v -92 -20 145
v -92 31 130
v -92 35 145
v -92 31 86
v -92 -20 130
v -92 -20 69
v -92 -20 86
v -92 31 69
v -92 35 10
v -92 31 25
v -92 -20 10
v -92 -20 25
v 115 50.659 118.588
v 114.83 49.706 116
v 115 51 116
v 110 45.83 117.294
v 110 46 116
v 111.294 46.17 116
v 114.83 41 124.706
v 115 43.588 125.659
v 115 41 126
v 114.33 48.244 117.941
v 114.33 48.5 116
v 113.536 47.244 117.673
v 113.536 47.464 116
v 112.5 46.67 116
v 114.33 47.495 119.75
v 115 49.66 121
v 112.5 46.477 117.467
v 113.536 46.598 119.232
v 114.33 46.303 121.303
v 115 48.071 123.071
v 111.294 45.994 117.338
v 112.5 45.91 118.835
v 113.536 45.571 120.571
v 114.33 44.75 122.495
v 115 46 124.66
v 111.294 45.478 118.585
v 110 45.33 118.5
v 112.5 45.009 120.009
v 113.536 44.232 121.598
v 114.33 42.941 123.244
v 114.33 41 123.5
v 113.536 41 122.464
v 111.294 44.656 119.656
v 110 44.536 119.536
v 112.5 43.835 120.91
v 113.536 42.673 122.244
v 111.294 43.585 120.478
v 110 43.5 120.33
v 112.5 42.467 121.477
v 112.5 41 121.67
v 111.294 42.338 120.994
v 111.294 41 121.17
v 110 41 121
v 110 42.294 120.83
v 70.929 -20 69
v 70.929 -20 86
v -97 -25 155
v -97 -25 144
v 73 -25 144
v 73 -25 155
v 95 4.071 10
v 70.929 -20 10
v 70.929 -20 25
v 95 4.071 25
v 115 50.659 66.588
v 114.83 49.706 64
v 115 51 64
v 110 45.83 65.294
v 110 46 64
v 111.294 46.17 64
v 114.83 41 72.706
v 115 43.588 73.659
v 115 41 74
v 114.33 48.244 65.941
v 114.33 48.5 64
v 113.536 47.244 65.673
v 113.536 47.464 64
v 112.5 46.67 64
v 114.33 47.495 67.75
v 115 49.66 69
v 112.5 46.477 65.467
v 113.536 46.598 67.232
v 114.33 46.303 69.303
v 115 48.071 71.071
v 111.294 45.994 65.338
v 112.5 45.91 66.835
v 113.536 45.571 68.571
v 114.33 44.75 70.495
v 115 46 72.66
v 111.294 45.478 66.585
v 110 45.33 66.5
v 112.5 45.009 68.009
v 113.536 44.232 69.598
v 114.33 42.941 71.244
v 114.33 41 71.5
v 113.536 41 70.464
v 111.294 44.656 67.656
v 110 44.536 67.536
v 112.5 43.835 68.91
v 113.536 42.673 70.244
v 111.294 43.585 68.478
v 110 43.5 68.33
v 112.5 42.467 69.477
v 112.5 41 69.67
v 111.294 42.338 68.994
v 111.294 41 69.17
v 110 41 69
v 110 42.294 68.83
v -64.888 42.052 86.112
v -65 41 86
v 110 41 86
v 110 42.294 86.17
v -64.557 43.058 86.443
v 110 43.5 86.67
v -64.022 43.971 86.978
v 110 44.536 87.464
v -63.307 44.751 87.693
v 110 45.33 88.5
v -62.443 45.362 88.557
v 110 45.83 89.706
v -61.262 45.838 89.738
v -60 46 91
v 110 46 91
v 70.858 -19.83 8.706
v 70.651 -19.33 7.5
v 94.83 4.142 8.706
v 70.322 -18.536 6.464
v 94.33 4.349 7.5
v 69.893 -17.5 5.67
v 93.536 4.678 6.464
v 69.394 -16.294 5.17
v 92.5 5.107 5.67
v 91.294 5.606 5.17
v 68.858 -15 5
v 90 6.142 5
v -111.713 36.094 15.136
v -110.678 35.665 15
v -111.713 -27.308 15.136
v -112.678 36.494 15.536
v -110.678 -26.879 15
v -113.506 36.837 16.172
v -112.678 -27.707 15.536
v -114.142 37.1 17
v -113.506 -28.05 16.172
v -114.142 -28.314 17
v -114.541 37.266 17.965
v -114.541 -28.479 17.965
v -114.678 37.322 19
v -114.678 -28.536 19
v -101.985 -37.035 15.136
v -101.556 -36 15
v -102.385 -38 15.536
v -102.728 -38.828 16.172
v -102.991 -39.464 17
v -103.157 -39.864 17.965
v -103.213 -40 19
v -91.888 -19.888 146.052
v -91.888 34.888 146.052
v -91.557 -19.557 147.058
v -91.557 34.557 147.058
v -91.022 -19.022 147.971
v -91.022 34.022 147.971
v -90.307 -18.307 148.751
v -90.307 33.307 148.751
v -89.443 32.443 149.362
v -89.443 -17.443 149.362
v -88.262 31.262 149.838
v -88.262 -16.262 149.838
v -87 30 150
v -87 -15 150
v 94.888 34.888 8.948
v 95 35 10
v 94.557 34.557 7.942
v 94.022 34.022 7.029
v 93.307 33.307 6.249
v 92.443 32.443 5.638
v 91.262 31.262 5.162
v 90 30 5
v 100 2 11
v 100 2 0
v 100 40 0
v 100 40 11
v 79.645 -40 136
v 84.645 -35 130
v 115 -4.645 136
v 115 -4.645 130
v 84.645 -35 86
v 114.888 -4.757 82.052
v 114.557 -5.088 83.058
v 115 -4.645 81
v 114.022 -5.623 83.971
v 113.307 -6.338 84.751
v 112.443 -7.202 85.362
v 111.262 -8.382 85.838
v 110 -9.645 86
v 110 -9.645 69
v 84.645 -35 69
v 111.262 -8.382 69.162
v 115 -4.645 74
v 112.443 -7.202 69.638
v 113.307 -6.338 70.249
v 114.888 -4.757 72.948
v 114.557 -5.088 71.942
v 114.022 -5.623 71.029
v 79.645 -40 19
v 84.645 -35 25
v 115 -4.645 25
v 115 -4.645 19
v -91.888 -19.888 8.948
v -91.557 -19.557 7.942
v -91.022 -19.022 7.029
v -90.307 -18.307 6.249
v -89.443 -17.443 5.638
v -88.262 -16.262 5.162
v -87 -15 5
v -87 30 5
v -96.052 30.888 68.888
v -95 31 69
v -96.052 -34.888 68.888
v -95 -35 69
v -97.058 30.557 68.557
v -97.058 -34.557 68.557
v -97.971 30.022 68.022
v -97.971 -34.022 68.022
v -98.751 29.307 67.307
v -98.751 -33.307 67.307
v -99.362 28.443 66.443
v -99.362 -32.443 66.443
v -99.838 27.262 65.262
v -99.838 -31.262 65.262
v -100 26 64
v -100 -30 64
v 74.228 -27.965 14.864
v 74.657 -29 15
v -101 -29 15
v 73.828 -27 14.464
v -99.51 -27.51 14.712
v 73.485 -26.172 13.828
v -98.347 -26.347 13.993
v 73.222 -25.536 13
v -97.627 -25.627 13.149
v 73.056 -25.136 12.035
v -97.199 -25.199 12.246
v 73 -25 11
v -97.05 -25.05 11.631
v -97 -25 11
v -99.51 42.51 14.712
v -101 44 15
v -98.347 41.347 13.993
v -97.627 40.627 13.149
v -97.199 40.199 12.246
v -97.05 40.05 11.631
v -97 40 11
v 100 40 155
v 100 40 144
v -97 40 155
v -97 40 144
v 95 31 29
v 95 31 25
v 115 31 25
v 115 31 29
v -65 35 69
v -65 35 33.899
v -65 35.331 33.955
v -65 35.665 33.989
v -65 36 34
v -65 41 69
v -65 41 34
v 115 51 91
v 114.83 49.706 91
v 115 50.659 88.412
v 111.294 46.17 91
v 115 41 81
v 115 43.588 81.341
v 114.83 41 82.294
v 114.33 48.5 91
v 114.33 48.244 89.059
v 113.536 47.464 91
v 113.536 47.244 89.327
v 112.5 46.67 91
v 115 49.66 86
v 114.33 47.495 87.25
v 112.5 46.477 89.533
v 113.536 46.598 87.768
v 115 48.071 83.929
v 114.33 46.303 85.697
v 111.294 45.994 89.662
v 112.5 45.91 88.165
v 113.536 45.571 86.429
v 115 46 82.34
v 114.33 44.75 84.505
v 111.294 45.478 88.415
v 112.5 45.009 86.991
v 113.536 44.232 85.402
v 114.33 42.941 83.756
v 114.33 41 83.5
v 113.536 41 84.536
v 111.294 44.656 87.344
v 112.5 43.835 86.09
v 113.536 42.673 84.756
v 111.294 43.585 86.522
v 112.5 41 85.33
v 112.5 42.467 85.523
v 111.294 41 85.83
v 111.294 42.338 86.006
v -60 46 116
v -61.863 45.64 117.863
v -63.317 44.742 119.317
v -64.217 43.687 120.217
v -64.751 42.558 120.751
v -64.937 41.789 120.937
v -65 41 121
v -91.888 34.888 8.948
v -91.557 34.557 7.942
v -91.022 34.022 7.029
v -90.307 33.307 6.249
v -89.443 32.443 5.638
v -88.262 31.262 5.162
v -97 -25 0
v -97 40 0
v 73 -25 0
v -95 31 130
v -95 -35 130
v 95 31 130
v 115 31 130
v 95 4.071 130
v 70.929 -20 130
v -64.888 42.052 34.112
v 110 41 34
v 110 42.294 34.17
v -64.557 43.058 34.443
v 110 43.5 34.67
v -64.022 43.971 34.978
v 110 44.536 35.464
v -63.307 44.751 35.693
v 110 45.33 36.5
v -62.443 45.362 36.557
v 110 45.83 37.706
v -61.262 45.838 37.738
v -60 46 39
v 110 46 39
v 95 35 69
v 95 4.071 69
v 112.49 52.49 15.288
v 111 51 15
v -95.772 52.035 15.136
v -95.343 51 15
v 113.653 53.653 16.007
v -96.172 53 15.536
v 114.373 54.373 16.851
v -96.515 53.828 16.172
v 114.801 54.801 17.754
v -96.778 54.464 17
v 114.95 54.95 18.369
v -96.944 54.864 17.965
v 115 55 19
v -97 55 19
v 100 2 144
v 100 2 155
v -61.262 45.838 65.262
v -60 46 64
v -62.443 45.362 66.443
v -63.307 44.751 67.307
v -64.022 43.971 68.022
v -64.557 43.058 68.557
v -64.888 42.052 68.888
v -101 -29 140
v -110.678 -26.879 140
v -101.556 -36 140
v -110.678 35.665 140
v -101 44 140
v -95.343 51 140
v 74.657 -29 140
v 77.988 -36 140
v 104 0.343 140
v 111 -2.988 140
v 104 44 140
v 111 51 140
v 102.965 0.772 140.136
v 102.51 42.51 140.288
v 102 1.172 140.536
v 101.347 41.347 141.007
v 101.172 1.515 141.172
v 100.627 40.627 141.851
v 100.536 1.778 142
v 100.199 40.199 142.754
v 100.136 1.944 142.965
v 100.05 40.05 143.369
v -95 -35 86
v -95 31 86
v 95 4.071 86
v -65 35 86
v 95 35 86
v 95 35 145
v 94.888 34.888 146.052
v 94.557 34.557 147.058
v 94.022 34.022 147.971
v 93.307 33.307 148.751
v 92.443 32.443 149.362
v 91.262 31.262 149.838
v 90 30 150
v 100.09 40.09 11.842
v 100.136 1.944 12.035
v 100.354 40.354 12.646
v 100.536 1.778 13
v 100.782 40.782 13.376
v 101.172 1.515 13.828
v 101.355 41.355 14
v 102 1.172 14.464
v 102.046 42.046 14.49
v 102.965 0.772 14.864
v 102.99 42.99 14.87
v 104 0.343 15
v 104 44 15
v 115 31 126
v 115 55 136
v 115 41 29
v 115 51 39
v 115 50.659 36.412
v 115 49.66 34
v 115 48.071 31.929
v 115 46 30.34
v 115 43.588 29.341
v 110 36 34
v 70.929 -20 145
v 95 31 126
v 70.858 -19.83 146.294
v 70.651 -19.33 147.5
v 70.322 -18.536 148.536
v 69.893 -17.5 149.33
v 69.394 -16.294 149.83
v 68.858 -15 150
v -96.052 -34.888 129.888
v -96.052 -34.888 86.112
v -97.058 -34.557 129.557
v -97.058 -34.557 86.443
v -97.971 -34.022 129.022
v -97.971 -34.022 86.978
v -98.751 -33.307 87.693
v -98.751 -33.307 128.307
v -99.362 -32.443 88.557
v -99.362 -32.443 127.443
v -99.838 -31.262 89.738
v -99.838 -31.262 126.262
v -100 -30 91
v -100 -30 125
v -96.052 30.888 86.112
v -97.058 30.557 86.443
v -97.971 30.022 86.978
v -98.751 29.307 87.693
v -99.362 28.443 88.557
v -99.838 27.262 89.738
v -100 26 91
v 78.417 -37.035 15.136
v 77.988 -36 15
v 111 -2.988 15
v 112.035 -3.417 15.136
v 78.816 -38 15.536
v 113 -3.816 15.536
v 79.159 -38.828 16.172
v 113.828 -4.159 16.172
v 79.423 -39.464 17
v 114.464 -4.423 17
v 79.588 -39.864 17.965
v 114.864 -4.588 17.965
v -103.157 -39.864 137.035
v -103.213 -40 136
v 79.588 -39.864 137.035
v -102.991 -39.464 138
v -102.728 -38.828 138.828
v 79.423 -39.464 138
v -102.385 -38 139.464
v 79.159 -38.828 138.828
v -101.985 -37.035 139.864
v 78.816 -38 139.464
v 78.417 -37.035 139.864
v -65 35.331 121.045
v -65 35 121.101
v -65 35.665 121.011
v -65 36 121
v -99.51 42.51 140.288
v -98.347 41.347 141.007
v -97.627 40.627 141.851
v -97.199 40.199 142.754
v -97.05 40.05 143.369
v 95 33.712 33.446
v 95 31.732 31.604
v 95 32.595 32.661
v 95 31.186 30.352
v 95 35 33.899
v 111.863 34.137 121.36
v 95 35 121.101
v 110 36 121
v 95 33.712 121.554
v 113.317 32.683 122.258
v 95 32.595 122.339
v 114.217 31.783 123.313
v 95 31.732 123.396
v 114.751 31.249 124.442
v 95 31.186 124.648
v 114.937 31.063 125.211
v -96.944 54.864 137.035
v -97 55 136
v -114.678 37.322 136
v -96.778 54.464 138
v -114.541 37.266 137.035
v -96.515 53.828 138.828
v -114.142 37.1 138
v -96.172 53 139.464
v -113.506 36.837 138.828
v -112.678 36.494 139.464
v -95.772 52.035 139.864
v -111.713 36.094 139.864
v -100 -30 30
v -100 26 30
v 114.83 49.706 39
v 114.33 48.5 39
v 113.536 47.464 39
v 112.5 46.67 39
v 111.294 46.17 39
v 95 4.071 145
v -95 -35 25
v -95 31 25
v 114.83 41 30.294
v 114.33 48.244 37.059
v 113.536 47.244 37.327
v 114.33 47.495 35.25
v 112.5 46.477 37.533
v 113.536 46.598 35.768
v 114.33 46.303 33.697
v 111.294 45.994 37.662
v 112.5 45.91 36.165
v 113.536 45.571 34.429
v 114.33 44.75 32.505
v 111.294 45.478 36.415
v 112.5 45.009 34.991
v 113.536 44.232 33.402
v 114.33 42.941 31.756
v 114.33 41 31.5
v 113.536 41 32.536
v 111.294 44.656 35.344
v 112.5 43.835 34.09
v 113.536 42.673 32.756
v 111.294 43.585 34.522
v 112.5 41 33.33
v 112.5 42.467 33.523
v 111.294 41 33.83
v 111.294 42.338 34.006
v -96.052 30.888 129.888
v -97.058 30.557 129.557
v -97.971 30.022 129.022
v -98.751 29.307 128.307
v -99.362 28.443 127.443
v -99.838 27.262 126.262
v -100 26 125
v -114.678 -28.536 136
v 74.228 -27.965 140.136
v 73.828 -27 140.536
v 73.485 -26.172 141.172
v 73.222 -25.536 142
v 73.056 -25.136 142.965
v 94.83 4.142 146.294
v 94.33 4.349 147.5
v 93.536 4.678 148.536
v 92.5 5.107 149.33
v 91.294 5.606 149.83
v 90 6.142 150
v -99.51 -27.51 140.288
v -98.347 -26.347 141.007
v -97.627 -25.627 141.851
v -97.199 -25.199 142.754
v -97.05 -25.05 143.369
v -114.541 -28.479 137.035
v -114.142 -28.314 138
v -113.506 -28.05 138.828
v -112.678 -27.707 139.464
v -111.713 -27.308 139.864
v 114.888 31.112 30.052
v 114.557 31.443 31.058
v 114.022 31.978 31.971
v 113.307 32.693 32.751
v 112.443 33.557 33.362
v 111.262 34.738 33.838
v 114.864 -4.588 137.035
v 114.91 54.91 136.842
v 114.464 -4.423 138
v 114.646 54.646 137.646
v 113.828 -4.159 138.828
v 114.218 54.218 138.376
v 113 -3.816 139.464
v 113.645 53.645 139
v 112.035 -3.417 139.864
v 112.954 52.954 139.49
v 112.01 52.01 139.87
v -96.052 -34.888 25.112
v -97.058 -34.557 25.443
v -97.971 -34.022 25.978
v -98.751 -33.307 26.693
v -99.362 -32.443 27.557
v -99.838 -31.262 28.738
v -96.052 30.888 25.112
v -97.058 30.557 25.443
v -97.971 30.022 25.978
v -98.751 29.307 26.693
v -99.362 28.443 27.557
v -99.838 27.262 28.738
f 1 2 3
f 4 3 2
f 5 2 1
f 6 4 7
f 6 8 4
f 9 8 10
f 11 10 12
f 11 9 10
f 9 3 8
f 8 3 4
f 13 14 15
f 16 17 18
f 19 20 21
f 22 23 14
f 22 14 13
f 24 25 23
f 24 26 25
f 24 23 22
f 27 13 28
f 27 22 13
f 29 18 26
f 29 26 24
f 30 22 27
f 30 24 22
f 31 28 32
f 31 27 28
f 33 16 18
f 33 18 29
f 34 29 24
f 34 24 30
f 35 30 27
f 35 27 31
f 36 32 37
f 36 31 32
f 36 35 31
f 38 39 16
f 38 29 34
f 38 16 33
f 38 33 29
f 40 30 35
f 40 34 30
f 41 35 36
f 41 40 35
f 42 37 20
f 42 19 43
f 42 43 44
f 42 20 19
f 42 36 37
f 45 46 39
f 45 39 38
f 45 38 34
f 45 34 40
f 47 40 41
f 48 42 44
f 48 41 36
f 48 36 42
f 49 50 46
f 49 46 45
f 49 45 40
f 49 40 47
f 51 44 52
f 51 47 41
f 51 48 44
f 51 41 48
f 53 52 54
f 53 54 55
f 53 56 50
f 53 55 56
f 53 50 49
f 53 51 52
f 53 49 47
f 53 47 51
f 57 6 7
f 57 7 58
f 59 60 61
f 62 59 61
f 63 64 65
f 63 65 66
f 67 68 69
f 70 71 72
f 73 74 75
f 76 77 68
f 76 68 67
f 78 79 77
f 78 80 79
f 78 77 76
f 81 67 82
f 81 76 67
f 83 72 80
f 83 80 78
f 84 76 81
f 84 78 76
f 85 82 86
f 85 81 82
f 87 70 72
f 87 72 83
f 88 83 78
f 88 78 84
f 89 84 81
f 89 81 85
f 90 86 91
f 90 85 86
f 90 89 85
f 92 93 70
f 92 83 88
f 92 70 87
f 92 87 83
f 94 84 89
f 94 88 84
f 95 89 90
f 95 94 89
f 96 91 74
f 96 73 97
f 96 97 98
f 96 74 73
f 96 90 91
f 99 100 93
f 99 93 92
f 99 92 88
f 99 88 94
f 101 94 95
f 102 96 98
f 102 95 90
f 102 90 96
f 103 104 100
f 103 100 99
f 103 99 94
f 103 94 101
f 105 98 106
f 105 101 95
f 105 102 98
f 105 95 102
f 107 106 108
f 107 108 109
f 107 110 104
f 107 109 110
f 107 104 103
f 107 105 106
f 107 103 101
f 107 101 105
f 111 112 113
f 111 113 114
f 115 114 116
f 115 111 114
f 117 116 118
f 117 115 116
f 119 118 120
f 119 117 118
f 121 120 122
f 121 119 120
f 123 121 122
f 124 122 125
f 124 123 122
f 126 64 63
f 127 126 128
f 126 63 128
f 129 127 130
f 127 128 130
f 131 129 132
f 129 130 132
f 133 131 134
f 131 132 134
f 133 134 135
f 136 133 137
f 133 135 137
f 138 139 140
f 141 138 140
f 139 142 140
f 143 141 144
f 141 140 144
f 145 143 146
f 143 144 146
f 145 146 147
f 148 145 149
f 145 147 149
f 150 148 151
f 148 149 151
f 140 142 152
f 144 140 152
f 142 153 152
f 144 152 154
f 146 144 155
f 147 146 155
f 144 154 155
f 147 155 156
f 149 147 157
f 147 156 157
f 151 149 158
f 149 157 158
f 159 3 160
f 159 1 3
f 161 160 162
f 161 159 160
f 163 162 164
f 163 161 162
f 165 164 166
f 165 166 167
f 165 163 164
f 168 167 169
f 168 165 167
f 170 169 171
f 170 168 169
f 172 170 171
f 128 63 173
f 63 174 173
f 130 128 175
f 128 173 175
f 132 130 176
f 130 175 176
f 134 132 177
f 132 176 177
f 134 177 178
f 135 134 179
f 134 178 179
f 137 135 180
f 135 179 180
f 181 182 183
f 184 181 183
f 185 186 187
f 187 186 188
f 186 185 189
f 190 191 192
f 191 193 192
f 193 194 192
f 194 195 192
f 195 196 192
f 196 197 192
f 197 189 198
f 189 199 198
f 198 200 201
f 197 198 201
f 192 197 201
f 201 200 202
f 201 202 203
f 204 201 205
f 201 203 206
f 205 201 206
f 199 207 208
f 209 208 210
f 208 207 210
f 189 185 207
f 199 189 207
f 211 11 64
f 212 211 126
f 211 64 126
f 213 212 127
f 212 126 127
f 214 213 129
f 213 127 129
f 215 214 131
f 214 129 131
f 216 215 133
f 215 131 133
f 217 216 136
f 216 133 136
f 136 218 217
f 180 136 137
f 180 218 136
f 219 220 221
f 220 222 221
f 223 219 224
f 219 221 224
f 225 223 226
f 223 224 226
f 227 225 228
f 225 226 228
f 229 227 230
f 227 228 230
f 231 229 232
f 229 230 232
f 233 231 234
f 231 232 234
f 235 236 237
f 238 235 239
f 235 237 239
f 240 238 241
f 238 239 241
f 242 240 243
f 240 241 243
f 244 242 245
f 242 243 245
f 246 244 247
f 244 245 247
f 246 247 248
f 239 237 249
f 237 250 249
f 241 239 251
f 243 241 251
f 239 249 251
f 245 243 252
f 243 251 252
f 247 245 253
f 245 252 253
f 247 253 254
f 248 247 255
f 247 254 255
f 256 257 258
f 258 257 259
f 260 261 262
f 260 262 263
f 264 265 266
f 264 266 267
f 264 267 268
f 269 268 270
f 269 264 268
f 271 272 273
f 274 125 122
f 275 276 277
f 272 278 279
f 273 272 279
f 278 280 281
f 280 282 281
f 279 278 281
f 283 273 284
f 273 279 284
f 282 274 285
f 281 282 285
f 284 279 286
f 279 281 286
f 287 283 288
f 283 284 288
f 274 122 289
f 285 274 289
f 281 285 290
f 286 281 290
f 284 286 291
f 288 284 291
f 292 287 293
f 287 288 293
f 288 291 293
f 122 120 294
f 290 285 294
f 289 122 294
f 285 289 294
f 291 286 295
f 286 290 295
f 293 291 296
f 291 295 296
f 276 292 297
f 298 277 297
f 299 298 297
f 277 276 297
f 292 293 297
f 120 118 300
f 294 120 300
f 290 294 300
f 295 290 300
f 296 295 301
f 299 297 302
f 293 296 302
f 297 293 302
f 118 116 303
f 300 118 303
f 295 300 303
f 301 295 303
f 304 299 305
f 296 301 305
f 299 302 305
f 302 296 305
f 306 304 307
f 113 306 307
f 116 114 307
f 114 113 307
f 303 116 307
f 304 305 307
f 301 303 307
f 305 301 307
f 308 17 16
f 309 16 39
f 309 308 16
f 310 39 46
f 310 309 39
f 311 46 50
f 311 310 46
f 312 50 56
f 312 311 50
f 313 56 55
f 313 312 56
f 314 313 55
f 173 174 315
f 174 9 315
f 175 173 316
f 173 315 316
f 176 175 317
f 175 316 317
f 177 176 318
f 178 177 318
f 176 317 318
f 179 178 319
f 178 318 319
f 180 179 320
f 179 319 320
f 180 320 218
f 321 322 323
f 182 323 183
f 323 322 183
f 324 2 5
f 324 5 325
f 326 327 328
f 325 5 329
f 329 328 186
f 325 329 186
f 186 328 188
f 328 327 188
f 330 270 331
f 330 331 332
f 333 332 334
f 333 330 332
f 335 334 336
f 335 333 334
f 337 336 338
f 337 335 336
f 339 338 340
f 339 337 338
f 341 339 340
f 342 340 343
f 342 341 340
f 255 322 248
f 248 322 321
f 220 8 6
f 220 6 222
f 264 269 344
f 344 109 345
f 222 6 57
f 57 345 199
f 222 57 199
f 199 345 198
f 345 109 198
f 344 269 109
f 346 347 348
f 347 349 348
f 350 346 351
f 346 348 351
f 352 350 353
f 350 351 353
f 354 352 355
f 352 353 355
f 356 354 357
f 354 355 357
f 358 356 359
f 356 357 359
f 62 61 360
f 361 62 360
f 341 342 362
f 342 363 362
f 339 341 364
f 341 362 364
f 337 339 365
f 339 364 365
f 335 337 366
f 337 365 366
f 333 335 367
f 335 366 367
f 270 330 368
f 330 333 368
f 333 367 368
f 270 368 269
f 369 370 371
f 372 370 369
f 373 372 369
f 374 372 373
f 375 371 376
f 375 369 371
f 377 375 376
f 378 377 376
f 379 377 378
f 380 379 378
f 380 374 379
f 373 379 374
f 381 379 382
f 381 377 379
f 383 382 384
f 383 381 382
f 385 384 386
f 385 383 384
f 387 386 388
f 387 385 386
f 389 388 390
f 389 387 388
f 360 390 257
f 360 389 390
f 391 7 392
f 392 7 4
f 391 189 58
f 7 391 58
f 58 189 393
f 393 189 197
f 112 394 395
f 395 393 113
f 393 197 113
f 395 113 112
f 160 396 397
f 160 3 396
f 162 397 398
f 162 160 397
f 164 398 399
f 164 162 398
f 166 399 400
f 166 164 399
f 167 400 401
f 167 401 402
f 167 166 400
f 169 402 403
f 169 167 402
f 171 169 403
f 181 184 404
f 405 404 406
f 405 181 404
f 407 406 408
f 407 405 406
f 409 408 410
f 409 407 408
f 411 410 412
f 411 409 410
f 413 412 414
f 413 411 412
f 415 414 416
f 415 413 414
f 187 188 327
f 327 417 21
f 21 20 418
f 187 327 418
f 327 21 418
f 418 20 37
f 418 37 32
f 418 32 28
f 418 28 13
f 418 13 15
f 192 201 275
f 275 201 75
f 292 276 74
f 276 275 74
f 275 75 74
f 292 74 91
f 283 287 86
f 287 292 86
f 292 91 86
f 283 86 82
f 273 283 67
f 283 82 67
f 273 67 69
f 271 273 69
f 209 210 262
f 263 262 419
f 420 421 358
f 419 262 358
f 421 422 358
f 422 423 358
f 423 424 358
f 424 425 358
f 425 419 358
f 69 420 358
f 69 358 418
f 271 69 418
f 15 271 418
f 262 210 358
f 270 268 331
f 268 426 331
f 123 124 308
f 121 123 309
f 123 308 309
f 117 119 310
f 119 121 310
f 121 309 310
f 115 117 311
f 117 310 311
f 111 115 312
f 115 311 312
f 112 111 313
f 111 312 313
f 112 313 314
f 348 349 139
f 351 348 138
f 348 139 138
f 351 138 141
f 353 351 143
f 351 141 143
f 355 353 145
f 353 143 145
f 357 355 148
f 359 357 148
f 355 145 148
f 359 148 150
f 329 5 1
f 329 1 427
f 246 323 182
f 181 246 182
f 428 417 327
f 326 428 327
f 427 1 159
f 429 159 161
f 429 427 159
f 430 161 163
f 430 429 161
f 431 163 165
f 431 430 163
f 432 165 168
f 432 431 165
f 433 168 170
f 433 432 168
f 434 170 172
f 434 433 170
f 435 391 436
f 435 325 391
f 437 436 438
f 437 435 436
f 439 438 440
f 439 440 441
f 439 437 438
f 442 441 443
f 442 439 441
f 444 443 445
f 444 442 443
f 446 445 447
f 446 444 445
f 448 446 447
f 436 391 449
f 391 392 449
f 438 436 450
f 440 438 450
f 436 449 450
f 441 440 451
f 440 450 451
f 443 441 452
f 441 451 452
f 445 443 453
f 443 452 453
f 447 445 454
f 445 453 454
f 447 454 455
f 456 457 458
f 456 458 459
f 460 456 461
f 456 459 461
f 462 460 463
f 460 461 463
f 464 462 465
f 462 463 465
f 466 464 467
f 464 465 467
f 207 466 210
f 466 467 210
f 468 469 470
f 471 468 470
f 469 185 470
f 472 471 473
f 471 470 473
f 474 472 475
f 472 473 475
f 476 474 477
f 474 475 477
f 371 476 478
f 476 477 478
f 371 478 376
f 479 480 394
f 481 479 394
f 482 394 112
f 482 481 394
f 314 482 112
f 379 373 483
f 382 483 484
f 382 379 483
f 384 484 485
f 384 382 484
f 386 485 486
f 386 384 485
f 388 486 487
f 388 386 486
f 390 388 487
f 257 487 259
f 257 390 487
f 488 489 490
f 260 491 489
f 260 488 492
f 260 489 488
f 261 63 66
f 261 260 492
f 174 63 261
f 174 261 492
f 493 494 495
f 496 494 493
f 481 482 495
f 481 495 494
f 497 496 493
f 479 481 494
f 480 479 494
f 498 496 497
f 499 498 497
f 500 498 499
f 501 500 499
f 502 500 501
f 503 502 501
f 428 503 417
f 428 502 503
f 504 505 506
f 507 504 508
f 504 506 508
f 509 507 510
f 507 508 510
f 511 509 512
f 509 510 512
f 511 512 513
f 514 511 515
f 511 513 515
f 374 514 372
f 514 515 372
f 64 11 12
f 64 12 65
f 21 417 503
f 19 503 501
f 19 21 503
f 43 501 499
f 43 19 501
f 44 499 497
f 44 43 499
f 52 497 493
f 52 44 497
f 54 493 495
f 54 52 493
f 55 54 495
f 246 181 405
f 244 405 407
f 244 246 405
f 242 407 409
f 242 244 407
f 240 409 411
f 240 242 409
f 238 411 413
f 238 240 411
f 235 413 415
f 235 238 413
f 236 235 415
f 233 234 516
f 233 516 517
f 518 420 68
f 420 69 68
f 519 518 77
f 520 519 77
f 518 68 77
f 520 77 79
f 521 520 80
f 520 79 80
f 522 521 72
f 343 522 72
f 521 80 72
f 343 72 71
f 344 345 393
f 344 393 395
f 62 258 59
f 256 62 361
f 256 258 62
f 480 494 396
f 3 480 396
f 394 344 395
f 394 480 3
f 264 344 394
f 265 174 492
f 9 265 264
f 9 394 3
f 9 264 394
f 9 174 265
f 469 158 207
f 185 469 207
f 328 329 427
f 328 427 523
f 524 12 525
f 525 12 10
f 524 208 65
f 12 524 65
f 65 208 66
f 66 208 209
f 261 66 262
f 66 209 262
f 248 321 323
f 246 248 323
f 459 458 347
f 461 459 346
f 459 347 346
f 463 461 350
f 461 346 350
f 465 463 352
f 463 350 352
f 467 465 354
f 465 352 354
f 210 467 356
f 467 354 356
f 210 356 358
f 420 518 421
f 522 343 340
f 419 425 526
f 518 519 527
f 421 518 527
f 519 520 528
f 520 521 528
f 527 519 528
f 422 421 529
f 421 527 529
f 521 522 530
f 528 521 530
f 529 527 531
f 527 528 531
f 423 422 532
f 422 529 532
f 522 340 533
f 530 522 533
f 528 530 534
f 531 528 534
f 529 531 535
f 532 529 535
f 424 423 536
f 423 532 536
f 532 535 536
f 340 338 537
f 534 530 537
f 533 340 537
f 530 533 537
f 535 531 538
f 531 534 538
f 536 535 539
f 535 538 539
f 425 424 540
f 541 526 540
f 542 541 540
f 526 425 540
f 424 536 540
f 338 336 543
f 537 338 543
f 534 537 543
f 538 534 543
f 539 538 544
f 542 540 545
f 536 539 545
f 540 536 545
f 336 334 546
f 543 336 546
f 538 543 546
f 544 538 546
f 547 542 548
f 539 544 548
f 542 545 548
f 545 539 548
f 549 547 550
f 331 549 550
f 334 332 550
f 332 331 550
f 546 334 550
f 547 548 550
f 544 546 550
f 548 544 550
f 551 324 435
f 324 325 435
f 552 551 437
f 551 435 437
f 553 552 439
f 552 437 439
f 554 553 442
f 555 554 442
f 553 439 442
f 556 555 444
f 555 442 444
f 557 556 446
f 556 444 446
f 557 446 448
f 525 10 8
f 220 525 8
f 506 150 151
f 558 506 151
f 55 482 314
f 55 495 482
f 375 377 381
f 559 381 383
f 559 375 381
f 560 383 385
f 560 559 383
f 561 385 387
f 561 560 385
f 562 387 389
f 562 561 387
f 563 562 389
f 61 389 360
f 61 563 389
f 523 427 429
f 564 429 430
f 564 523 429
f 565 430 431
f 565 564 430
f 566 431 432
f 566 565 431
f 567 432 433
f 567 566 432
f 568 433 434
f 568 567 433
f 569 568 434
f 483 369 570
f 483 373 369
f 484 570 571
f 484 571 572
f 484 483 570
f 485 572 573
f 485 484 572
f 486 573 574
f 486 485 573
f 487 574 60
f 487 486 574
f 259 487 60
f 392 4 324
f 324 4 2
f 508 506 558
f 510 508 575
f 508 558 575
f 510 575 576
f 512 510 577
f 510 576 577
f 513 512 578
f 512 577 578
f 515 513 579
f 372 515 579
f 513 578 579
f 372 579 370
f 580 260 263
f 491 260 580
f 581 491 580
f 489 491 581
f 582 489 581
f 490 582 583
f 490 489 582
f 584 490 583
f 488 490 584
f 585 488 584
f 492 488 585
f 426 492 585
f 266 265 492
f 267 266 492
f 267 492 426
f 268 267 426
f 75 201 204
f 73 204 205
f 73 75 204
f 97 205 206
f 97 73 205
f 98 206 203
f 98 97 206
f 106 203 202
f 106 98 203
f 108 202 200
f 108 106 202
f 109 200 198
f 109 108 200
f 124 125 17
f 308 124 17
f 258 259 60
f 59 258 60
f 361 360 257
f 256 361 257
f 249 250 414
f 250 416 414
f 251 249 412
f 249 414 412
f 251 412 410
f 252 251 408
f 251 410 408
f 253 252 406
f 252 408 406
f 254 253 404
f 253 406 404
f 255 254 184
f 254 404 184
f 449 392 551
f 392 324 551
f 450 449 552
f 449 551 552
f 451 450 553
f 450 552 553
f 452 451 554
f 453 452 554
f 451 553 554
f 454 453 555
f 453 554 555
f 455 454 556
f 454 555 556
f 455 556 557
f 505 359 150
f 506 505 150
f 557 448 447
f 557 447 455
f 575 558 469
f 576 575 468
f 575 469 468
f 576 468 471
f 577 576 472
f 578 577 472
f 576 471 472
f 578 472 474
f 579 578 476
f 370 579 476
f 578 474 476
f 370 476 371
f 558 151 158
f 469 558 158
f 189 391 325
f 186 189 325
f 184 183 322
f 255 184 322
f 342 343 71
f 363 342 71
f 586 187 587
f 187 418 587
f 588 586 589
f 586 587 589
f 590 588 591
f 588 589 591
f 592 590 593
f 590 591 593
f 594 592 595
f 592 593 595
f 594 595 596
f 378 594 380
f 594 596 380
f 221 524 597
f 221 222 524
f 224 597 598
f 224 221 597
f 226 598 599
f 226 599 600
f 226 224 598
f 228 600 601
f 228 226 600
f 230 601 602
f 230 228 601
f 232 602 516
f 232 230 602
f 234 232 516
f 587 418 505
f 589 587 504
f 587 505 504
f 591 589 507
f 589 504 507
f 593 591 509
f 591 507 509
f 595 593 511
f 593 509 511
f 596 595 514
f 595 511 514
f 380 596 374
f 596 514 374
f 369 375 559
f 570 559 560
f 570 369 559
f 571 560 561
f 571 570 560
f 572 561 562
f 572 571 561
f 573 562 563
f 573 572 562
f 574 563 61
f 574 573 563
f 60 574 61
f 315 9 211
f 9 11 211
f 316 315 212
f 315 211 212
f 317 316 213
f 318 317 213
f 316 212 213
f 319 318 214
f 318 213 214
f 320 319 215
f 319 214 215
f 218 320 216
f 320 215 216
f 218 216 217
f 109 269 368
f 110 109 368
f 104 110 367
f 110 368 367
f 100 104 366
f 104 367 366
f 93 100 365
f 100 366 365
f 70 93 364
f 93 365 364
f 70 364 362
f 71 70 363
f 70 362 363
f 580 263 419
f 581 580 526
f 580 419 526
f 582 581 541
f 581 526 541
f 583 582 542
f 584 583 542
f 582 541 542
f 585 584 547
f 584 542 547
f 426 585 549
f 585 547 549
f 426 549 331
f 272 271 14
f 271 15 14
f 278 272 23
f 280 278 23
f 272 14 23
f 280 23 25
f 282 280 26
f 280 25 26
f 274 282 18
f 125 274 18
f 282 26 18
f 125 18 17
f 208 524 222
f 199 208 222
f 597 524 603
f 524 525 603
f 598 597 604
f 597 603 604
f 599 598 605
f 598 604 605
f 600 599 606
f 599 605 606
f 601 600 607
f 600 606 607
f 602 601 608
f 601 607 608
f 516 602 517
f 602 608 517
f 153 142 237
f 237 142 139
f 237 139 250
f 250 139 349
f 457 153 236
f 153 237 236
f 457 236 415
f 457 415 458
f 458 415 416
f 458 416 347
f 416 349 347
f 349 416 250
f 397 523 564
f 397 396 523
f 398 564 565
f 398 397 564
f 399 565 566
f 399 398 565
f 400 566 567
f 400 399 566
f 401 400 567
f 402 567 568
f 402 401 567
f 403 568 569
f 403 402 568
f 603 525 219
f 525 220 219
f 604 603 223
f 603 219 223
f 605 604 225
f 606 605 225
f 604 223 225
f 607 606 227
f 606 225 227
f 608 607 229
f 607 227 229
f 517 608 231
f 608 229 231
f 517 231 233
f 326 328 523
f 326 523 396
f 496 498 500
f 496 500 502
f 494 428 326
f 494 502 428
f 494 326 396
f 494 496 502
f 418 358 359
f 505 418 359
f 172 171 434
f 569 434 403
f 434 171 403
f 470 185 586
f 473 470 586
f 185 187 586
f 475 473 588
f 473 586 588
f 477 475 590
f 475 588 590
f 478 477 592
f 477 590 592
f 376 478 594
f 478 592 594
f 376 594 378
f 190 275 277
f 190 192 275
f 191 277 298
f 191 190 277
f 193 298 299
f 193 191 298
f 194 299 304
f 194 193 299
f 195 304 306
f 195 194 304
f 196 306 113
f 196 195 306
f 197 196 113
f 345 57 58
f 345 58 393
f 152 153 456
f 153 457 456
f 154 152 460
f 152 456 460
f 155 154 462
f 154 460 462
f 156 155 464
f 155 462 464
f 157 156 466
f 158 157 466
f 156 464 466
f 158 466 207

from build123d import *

# Parameters (mm, degrees)
F1_DEPTH = 155
F2_START = 15
F2_DEPTH = 125
F3_R     = 4
F4_W     = 30.3553390593
F4_H     = 44
F5_DEPTH = 215
F4_W_2   = 15
F4_H_2   = 35
F6_DEPTH = 180
F7_START = 5
F7_DEPTH = 145
F8_R     = 5


with BuildPart() as f1:
    # F0 (on Top) → F1 (new body)
    with BuildSketch(Plane.XY):
        Polygon((73, -25), (100, 2), (100, 40), (-97, 40), (-97, -25), align=None)
        Polygon((95, 35), (95, 4.0710678119), (70.9289321881, -20), (-92, -20), (-92, 35), align=None, mode=Mode.SUBTRACT)
        Polygon((70.9289321881, -20), (95, 4.0710678119), (95, 35), (-92, 35), (-92, -20), align=None)
    extrude(amount=F1_DEPTH)

    # F0 (on Top) → F2 (join)
    with BuildSketch(Plane.XY.offset(F2_START)):
        Polygon((-114.6776695297, -28.5355339059), (-103.2132034356, -40), (79.6446609407, -40), (115, -4.6446609407), (115, 55), (-97, 55), (-114.6776695297, 37.3223304703), align=None)
        Polygon((100, 40), (100, 2), (73, -25), (-97, -25), (-97, 40), align=None, mode=Mode.SUBTRACT)
    extrude(amount=F2_DEPTH)

    # F3
    f3_edges = [f1.edges().sort_by_distance(p)[0] for p in [
        (97.32233, -22.32233, 140),
        (115, 25.17767, 140),
        (9, 55, 140),
        (-105.838835, 46.161165, 140),
        (-114.67767, 4.393398, 140),
        (-108.945436, -34.267767, 140),
        (-11.784271, -40, 140),
        (100, 21, 140),
        (86.5, -11.5, 140),
        (-12, -25, 140),
        (-97, 7.5, 140),
        (1.5, 40, 140),
        (97.32233, -22.32233, 15),
        (115, 25.17767, 15),
        (9, 55, 15),
        (-105.838835, 46.161165, 15),
        (-114.67767, 4.393398, 15),
        (-108.945436, -34.267767, 15),
        (-11.784271, -40, 15),
        (100, 21, 15),
        (86.5, -11.5, 15),
        (-12, -25, 15),
        (-97, 7.5, 15),
        (1.5, 40, 15),
    ]]
    fillet(f3_edges, radius=F3_R)

    # F4 (on face) → F5 (cut)
    with BuildSketch(Plane.YZ.offset(115)):
        Polygon((31, 121), (31, 130), (-4.6446609407, 130), (-4.6446609407, 86), (31, 86), align=None)
        with Locations((-19.8223304703, 108)):
            Rectangle(F4_W, F4_H)
        with Locations((-19.8223304703, 47)):
            Rectangle(F4_W, F4_H)
        Polygon((31, 69), (-4.6446609407, 69), (-4.6446609407, 25), (31, 25), (31, 34), align=None)
    extrude(amount=-F5_DEPTH, mode=Mode.SUBTRACT)

    # F4 (on face) → F6 (cut)
    with BuildSketch(Plane.YZ.offset(115)):
        with Locations((38.5, 51.5)):
            Rectangle(F4_W_2, F4_H_2)
        with Locations((38.5, 103.5)):
            Rectangle(F4_W_2, F4_H_2)
    extrude(amount=-F6_DEPTH, mode=Mode.SUBTRACT)

    # F0 (on Top) → F7 (cut)
    with BuildSketch(Plane.XY.offset(F7_START)):
        Polygon((70.9289321881, -20), (95, 4.0710678119), (95, 35), (-92, 35), (-92, -20), align=None)
    extrude(amount=F7_DEPTH, mode=Mode.SUBTRACT)

    # F8
    f8_edges = [f1.edges().sort_by_distance(p)[0] for p in [
        (105, 31, 121),
        (105, 31, 34),
        (-100, 31, 108),
        (-100, -2, 130),
        (-100, -35, 108),
        (-100, -2, 86),
        (-100, -35, 47),
        (-100, -2, 25),
        (-100, 31, 47),
        (-100, -2, 69),
        (82.964466, -7.964466, 5),
        (95, 19.535534, 5),
        (1.5, 35, 5),
        (-92, 7.5, 5),
        (-10.535534, -20, 5),
        (82.964466, -7.964466, 150),
        (95, 19.535534, 150),
        (1.5, 35, 150),
        (-92, 7.5, 150),
        (-10.535534, -20, 150),
        (25, 46, 86),
        (25, 46, 121),
        (115, 46, 103.5),
        (-65, 46, 103.5),
        (25, 46, 34),
        (25, 46, 69),
        (115, 46, 51.5),
        (-65, 46, 51.5),
        (115, 38.5, 34),
        (115, 20.67767, 69),
        (115, 20.67767, 86),
        (115, 38.5, 121),
    ]]
    fillet(f8_edges, radius=F8_R)


solid = f1.part
